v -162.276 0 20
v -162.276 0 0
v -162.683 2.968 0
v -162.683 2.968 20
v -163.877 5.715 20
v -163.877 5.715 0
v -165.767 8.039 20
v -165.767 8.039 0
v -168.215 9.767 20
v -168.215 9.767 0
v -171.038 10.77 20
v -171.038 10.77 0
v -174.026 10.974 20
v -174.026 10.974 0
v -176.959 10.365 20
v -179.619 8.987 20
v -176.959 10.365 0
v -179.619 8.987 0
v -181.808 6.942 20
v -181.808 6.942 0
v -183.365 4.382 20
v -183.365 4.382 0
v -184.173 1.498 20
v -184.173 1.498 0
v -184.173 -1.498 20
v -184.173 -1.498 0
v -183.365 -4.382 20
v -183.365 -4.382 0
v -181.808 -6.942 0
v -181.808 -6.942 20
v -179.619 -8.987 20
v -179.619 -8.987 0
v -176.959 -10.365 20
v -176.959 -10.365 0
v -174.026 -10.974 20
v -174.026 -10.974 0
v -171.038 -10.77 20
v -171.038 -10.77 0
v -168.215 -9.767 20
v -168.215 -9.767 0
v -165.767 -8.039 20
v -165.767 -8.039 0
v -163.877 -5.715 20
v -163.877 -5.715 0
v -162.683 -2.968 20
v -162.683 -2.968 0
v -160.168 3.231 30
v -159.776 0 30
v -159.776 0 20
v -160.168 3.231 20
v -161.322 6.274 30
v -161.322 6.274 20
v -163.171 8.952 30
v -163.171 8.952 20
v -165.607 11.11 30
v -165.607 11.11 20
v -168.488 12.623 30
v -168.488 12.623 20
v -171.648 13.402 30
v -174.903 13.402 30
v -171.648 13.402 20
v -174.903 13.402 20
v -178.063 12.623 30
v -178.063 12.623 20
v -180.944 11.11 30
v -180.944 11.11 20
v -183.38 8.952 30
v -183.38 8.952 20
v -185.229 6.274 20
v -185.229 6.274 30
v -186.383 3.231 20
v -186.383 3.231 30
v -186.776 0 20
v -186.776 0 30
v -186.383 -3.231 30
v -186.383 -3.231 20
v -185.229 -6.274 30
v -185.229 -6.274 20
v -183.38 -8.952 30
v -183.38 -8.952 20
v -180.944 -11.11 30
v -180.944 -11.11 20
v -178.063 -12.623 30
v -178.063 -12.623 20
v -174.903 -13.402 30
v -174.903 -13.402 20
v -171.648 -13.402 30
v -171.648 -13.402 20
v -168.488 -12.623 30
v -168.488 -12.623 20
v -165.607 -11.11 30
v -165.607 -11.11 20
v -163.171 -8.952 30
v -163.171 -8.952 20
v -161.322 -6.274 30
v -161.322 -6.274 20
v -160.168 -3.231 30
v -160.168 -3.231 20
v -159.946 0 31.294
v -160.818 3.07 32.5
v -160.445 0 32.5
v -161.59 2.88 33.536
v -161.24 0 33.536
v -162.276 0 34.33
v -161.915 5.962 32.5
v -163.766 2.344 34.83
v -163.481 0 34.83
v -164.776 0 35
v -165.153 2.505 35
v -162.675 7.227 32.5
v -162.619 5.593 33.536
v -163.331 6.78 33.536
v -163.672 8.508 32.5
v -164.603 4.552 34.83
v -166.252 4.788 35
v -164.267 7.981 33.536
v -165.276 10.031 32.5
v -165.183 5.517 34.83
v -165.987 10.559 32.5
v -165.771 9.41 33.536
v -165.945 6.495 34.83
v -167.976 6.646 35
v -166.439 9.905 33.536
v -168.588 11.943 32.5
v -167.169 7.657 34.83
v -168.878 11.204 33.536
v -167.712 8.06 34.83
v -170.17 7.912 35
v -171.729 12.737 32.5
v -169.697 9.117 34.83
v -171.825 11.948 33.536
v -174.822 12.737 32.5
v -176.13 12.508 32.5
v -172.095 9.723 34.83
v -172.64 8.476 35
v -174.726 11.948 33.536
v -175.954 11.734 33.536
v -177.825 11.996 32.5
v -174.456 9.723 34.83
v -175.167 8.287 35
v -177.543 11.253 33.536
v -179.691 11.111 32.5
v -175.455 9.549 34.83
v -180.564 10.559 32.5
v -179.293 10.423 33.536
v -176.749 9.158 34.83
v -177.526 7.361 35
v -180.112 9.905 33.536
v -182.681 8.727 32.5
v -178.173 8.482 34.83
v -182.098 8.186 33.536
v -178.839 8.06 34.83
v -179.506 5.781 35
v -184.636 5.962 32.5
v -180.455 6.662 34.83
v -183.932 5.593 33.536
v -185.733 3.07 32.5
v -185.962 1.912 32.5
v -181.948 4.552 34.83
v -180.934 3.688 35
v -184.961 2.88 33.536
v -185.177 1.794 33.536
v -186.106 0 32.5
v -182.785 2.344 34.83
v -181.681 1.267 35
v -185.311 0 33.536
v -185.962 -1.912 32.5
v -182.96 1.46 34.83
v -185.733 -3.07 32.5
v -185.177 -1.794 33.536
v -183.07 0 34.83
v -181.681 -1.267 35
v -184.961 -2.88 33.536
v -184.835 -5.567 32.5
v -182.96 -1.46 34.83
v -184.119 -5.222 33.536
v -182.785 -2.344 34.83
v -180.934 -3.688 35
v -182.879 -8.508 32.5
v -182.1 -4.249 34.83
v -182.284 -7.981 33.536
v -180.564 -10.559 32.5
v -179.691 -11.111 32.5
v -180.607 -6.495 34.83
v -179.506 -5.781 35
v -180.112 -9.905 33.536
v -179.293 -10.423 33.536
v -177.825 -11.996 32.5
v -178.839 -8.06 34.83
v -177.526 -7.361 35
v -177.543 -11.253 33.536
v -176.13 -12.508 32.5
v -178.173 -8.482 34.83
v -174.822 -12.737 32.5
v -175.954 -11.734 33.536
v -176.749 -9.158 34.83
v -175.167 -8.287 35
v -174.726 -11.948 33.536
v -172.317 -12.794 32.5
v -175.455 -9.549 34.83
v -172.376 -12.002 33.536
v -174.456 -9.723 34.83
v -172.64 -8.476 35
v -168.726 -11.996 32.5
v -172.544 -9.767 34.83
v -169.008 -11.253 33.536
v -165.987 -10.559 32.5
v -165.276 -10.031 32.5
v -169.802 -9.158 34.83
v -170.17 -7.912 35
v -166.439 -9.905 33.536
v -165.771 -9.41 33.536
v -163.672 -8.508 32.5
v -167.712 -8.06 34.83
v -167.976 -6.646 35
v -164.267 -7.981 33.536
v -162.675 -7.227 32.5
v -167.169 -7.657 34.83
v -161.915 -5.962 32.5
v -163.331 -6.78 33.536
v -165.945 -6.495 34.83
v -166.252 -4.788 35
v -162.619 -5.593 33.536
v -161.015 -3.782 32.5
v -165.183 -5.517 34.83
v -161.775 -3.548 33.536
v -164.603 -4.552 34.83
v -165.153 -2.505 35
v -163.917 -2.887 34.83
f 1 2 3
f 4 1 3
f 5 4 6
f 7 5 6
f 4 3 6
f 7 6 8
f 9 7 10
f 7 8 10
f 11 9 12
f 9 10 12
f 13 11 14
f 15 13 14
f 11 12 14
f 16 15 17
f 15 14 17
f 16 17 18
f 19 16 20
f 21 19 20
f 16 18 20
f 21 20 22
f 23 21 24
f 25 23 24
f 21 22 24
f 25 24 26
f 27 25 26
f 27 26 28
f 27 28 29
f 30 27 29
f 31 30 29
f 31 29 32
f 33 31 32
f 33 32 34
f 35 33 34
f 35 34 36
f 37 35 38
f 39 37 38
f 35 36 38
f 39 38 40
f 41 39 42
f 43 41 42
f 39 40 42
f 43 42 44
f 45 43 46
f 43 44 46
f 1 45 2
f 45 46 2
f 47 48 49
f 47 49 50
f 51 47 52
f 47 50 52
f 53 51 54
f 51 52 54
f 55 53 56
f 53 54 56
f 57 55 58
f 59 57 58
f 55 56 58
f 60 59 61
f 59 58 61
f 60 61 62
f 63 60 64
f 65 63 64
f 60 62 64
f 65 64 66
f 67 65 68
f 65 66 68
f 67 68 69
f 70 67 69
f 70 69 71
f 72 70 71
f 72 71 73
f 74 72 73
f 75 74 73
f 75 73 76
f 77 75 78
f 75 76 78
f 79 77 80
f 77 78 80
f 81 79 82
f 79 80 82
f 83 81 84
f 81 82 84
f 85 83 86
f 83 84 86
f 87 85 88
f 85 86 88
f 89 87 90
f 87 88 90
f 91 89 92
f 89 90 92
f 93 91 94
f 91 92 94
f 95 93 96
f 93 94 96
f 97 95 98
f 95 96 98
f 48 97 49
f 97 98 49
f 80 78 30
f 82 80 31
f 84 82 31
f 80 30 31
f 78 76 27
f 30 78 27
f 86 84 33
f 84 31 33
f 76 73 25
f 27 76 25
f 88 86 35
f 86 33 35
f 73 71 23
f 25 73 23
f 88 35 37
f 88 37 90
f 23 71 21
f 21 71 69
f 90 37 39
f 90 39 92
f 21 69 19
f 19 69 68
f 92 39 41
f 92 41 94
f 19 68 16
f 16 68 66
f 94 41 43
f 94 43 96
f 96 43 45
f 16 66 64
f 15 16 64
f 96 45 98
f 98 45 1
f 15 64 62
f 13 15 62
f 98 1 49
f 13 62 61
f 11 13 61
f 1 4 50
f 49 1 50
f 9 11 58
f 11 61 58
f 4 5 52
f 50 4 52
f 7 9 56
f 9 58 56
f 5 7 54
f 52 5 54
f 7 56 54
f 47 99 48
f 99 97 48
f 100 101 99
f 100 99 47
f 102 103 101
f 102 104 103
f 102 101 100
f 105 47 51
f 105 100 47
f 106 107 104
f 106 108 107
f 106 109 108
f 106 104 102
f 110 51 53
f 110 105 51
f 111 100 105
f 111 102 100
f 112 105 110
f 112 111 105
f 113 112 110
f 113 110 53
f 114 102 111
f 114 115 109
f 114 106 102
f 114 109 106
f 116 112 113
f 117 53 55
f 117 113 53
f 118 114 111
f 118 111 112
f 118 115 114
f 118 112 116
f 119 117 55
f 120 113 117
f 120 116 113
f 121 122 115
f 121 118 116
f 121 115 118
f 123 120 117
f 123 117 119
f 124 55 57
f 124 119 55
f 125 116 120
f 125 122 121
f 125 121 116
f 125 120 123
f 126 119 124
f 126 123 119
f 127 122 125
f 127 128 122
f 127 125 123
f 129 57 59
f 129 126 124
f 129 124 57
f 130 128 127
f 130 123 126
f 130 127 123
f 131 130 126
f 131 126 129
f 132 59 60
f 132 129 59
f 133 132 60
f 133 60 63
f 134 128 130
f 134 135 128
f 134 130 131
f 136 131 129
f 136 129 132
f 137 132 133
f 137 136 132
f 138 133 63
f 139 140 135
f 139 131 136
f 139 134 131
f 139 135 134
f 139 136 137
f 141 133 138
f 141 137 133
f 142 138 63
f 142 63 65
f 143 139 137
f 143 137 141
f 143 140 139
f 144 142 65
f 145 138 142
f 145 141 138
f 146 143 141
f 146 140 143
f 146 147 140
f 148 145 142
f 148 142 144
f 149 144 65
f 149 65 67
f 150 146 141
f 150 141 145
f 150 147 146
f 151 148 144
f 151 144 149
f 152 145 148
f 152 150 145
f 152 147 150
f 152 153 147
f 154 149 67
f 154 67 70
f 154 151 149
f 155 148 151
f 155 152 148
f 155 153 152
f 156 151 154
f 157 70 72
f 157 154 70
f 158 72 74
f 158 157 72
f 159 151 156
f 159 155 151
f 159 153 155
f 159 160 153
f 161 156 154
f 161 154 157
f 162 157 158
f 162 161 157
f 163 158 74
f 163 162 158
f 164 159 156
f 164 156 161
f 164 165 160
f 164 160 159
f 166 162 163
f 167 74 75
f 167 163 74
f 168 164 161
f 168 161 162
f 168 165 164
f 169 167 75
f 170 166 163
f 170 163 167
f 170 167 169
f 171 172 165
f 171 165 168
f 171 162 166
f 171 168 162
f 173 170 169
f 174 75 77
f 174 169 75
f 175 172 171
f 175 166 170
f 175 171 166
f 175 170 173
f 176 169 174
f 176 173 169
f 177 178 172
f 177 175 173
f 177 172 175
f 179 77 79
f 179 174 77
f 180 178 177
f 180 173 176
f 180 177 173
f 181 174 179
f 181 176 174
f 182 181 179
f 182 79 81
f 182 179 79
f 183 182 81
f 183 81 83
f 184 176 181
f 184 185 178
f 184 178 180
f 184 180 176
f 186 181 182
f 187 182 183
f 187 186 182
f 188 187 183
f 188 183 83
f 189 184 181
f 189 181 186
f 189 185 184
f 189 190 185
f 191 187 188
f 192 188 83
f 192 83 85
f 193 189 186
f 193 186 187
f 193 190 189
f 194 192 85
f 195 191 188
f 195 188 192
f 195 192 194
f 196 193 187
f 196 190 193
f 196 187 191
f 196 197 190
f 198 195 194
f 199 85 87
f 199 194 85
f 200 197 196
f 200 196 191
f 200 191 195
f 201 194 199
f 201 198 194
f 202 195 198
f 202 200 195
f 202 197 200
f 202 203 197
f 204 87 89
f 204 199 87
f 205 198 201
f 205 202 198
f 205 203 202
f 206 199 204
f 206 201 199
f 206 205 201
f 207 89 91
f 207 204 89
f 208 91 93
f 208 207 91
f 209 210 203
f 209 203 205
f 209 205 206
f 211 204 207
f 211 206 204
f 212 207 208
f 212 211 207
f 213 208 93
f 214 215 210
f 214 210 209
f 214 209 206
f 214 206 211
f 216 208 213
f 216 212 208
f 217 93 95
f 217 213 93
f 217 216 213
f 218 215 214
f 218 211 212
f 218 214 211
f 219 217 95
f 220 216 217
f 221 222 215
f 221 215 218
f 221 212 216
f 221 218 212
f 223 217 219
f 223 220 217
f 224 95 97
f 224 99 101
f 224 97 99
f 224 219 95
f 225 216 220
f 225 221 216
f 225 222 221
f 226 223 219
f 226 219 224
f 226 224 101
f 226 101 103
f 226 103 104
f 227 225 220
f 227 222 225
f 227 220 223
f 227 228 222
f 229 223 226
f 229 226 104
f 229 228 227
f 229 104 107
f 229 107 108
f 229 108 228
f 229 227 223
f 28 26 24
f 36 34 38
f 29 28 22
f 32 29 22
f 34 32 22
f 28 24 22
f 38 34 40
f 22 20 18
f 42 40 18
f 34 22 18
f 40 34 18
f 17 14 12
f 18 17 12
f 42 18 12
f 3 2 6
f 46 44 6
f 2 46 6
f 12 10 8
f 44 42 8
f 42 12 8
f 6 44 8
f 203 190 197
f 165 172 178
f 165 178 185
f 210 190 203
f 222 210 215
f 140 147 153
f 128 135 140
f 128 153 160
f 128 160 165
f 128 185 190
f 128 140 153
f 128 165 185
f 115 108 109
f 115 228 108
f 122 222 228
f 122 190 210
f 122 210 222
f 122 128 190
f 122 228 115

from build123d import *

# Parameters (mm, degrees)
SKETCH_1_R      = 11
EXTRUDE_1_DEPTH = 20
SKETCH_2_R      = 13.5
EXTRUDE_2_DEPTH = 15
FILLET_1_R      = 5


with BuildPart() as part:
    # 草图1 → 凸台-拉伸1 (new body)
    with BuildSketch(Plane.XY):
        with Locations((-173.275516994, 0)):
            Circle(SKETCH_1_R)
    extrude(amount=EXTRUDE_1_DEPTH)

    # 草图2 → 凸台-拉伸2 (add)
    with BuildSketch(Plane.XY.offset(20)):
        with Locations((-173.275516994, 0)):
            Circle(SKETCH_2_R)
    extrude(amount=EXTRUDE_2_DEPTH)

    # 圆角1
    fillet_1_edges = [part.edges().sort_by_distance(p)[0] for p in [
        (-186.775516994, 0, 35),
    ]]
    fillet(fillet_1_edges, radius=FILLET_1_R)


solid = part.part
